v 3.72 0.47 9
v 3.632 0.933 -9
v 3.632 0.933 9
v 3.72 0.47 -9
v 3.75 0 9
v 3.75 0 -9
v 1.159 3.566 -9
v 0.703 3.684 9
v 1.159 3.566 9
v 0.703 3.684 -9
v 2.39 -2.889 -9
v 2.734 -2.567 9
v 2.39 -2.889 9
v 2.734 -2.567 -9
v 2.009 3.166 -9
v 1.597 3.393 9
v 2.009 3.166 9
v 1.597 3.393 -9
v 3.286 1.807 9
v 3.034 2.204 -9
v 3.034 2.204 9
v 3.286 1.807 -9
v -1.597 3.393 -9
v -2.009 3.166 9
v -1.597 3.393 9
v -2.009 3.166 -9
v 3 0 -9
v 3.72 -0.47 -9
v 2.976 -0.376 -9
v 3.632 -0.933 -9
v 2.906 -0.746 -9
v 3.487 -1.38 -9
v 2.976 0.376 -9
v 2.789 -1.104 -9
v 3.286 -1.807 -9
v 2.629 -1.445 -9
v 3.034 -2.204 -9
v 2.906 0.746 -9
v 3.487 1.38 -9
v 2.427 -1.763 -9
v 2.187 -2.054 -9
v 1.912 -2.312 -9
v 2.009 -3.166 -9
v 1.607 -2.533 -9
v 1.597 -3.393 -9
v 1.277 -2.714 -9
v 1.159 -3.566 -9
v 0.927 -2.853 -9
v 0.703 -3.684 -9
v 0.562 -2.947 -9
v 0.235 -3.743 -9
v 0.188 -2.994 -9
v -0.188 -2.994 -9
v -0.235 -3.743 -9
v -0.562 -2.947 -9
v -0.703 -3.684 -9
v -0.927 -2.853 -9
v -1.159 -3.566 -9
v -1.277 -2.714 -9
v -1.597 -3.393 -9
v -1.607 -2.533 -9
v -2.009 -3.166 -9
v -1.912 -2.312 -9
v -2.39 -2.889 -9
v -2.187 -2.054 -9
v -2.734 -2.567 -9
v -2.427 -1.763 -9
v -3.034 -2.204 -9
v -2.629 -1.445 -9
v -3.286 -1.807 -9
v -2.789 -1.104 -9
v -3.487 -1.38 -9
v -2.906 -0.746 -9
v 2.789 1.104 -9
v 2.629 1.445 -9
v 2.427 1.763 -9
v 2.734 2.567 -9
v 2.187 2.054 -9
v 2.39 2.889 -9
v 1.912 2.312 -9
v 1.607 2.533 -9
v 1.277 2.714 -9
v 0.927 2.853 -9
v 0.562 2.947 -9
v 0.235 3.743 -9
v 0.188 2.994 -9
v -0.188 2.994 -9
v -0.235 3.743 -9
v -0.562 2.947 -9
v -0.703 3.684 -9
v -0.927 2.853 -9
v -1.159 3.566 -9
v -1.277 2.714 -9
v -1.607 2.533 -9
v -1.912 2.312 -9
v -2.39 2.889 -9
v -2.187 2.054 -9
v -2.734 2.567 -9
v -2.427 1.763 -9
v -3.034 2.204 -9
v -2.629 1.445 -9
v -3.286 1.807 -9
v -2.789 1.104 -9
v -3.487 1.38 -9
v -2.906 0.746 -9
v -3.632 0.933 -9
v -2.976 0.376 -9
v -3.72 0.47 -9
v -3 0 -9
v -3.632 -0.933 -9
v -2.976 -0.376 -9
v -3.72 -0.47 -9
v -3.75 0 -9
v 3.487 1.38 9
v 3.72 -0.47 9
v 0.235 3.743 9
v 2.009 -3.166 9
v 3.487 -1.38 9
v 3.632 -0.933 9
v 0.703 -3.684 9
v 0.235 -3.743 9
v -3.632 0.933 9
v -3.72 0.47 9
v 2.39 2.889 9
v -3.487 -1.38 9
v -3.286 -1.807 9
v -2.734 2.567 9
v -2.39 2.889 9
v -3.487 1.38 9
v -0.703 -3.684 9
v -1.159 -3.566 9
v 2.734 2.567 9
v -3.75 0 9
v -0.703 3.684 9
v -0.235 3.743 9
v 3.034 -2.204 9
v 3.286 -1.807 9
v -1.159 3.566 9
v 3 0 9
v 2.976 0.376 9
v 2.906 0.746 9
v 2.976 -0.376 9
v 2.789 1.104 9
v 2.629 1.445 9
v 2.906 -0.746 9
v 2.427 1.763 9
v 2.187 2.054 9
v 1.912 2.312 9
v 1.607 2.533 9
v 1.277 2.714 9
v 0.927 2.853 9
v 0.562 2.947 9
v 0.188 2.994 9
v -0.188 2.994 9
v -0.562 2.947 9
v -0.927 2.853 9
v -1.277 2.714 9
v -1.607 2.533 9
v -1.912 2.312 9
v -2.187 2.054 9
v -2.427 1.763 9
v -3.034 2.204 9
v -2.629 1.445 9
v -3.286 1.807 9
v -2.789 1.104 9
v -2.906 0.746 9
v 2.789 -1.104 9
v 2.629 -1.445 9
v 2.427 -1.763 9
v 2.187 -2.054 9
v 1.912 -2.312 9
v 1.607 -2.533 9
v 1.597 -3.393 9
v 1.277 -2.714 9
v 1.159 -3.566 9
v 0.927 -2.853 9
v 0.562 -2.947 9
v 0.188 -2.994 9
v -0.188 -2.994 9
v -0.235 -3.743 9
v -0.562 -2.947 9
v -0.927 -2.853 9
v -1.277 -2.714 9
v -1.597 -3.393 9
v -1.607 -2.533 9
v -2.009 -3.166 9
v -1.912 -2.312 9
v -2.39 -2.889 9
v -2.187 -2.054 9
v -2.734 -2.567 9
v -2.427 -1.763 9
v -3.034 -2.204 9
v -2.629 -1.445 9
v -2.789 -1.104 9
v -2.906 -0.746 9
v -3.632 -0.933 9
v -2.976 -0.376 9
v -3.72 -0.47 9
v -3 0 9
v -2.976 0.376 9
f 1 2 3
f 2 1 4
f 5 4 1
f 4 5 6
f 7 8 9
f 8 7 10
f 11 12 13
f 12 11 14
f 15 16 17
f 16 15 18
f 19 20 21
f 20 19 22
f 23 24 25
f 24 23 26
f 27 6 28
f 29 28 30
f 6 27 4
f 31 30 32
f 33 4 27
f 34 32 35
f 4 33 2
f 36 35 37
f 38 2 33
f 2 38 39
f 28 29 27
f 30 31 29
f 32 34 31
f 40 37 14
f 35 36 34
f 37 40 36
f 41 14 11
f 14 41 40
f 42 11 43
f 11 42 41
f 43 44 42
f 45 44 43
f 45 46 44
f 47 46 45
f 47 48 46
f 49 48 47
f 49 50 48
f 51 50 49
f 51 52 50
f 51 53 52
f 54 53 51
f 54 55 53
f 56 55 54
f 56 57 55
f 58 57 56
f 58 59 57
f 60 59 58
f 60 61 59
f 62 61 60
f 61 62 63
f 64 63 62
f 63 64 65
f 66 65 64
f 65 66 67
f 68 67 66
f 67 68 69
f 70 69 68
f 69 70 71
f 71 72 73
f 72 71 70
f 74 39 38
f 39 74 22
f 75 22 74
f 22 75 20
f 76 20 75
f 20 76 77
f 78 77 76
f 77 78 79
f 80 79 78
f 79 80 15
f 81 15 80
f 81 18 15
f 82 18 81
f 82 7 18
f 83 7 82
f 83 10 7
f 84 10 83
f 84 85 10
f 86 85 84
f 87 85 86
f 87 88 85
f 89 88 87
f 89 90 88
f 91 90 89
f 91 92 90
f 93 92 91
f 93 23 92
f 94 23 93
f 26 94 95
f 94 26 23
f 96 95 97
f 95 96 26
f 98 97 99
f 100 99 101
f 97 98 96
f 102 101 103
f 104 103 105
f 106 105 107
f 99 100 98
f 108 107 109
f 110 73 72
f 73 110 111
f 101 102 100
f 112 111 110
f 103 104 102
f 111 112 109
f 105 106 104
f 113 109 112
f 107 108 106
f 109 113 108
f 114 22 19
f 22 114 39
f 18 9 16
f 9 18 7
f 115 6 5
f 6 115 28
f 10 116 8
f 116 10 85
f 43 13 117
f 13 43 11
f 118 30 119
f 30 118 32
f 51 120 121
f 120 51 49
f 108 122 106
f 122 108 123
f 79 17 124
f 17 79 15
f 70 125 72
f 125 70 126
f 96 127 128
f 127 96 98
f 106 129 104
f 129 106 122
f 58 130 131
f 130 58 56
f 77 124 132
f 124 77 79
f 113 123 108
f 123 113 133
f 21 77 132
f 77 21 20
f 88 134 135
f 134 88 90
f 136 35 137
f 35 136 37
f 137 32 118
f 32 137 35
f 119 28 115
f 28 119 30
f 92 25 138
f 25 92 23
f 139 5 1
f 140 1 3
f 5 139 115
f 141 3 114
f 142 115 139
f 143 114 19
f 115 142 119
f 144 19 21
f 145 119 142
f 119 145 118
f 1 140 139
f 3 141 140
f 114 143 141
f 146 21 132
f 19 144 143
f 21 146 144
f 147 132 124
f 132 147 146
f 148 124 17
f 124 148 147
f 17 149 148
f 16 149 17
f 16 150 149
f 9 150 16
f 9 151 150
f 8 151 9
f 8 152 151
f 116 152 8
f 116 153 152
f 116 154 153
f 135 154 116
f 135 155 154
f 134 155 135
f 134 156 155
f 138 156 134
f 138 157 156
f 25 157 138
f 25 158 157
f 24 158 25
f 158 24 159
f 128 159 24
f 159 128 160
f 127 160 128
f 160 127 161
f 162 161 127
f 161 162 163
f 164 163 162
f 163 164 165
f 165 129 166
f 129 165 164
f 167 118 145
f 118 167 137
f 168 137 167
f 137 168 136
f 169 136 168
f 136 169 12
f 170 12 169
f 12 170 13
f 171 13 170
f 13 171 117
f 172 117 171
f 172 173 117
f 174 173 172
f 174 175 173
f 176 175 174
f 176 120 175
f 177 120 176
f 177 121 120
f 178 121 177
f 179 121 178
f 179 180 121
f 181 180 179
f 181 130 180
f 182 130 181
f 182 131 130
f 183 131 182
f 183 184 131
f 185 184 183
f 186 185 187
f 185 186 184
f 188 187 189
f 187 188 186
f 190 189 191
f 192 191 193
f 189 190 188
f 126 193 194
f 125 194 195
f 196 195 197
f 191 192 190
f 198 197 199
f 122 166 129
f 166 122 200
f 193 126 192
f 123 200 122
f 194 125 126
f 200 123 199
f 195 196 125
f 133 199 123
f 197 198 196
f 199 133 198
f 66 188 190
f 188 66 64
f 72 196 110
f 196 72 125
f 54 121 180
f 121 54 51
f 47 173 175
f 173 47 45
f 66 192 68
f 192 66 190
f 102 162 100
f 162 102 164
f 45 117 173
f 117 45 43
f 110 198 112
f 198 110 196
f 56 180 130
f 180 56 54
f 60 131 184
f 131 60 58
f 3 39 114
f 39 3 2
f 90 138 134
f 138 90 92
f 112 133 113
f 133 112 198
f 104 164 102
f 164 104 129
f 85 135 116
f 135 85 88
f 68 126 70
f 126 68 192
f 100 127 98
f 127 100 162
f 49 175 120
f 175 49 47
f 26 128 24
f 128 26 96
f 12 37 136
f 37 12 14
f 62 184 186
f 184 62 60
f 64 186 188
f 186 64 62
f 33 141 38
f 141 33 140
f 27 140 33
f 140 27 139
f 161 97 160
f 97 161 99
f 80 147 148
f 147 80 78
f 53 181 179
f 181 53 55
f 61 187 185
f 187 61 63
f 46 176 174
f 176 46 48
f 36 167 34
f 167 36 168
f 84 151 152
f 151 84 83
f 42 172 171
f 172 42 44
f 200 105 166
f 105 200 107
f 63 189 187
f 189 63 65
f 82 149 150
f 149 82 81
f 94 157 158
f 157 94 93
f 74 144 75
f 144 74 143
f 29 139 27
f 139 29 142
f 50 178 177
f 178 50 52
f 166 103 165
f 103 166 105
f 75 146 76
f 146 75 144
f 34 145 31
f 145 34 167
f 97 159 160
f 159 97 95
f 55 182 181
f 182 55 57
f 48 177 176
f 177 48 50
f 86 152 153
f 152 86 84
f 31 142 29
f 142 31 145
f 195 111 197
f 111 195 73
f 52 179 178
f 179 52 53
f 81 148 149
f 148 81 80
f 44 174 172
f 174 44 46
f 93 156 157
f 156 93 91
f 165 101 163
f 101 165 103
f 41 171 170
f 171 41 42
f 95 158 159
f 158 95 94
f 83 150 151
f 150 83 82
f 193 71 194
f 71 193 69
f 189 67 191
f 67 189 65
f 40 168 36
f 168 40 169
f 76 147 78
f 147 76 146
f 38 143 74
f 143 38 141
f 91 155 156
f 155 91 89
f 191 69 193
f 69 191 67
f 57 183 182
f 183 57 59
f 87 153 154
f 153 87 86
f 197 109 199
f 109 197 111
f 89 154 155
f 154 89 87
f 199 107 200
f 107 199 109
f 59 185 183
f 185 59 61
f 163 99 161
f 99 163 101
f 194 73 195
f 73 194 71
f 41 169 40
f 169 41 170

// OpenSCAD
$fn = 50;


difference() {
	union() {
		translate(v = [0, 0, -9.0000000000]) {
			cylinder(h = 18, r = 3.7500000000);
		}
	}
	union() {
		translate(v = [0, 0, -100.0000000000]) {
			cylinder(h = 200, r = 3.0000000000);
		}
	}
}
